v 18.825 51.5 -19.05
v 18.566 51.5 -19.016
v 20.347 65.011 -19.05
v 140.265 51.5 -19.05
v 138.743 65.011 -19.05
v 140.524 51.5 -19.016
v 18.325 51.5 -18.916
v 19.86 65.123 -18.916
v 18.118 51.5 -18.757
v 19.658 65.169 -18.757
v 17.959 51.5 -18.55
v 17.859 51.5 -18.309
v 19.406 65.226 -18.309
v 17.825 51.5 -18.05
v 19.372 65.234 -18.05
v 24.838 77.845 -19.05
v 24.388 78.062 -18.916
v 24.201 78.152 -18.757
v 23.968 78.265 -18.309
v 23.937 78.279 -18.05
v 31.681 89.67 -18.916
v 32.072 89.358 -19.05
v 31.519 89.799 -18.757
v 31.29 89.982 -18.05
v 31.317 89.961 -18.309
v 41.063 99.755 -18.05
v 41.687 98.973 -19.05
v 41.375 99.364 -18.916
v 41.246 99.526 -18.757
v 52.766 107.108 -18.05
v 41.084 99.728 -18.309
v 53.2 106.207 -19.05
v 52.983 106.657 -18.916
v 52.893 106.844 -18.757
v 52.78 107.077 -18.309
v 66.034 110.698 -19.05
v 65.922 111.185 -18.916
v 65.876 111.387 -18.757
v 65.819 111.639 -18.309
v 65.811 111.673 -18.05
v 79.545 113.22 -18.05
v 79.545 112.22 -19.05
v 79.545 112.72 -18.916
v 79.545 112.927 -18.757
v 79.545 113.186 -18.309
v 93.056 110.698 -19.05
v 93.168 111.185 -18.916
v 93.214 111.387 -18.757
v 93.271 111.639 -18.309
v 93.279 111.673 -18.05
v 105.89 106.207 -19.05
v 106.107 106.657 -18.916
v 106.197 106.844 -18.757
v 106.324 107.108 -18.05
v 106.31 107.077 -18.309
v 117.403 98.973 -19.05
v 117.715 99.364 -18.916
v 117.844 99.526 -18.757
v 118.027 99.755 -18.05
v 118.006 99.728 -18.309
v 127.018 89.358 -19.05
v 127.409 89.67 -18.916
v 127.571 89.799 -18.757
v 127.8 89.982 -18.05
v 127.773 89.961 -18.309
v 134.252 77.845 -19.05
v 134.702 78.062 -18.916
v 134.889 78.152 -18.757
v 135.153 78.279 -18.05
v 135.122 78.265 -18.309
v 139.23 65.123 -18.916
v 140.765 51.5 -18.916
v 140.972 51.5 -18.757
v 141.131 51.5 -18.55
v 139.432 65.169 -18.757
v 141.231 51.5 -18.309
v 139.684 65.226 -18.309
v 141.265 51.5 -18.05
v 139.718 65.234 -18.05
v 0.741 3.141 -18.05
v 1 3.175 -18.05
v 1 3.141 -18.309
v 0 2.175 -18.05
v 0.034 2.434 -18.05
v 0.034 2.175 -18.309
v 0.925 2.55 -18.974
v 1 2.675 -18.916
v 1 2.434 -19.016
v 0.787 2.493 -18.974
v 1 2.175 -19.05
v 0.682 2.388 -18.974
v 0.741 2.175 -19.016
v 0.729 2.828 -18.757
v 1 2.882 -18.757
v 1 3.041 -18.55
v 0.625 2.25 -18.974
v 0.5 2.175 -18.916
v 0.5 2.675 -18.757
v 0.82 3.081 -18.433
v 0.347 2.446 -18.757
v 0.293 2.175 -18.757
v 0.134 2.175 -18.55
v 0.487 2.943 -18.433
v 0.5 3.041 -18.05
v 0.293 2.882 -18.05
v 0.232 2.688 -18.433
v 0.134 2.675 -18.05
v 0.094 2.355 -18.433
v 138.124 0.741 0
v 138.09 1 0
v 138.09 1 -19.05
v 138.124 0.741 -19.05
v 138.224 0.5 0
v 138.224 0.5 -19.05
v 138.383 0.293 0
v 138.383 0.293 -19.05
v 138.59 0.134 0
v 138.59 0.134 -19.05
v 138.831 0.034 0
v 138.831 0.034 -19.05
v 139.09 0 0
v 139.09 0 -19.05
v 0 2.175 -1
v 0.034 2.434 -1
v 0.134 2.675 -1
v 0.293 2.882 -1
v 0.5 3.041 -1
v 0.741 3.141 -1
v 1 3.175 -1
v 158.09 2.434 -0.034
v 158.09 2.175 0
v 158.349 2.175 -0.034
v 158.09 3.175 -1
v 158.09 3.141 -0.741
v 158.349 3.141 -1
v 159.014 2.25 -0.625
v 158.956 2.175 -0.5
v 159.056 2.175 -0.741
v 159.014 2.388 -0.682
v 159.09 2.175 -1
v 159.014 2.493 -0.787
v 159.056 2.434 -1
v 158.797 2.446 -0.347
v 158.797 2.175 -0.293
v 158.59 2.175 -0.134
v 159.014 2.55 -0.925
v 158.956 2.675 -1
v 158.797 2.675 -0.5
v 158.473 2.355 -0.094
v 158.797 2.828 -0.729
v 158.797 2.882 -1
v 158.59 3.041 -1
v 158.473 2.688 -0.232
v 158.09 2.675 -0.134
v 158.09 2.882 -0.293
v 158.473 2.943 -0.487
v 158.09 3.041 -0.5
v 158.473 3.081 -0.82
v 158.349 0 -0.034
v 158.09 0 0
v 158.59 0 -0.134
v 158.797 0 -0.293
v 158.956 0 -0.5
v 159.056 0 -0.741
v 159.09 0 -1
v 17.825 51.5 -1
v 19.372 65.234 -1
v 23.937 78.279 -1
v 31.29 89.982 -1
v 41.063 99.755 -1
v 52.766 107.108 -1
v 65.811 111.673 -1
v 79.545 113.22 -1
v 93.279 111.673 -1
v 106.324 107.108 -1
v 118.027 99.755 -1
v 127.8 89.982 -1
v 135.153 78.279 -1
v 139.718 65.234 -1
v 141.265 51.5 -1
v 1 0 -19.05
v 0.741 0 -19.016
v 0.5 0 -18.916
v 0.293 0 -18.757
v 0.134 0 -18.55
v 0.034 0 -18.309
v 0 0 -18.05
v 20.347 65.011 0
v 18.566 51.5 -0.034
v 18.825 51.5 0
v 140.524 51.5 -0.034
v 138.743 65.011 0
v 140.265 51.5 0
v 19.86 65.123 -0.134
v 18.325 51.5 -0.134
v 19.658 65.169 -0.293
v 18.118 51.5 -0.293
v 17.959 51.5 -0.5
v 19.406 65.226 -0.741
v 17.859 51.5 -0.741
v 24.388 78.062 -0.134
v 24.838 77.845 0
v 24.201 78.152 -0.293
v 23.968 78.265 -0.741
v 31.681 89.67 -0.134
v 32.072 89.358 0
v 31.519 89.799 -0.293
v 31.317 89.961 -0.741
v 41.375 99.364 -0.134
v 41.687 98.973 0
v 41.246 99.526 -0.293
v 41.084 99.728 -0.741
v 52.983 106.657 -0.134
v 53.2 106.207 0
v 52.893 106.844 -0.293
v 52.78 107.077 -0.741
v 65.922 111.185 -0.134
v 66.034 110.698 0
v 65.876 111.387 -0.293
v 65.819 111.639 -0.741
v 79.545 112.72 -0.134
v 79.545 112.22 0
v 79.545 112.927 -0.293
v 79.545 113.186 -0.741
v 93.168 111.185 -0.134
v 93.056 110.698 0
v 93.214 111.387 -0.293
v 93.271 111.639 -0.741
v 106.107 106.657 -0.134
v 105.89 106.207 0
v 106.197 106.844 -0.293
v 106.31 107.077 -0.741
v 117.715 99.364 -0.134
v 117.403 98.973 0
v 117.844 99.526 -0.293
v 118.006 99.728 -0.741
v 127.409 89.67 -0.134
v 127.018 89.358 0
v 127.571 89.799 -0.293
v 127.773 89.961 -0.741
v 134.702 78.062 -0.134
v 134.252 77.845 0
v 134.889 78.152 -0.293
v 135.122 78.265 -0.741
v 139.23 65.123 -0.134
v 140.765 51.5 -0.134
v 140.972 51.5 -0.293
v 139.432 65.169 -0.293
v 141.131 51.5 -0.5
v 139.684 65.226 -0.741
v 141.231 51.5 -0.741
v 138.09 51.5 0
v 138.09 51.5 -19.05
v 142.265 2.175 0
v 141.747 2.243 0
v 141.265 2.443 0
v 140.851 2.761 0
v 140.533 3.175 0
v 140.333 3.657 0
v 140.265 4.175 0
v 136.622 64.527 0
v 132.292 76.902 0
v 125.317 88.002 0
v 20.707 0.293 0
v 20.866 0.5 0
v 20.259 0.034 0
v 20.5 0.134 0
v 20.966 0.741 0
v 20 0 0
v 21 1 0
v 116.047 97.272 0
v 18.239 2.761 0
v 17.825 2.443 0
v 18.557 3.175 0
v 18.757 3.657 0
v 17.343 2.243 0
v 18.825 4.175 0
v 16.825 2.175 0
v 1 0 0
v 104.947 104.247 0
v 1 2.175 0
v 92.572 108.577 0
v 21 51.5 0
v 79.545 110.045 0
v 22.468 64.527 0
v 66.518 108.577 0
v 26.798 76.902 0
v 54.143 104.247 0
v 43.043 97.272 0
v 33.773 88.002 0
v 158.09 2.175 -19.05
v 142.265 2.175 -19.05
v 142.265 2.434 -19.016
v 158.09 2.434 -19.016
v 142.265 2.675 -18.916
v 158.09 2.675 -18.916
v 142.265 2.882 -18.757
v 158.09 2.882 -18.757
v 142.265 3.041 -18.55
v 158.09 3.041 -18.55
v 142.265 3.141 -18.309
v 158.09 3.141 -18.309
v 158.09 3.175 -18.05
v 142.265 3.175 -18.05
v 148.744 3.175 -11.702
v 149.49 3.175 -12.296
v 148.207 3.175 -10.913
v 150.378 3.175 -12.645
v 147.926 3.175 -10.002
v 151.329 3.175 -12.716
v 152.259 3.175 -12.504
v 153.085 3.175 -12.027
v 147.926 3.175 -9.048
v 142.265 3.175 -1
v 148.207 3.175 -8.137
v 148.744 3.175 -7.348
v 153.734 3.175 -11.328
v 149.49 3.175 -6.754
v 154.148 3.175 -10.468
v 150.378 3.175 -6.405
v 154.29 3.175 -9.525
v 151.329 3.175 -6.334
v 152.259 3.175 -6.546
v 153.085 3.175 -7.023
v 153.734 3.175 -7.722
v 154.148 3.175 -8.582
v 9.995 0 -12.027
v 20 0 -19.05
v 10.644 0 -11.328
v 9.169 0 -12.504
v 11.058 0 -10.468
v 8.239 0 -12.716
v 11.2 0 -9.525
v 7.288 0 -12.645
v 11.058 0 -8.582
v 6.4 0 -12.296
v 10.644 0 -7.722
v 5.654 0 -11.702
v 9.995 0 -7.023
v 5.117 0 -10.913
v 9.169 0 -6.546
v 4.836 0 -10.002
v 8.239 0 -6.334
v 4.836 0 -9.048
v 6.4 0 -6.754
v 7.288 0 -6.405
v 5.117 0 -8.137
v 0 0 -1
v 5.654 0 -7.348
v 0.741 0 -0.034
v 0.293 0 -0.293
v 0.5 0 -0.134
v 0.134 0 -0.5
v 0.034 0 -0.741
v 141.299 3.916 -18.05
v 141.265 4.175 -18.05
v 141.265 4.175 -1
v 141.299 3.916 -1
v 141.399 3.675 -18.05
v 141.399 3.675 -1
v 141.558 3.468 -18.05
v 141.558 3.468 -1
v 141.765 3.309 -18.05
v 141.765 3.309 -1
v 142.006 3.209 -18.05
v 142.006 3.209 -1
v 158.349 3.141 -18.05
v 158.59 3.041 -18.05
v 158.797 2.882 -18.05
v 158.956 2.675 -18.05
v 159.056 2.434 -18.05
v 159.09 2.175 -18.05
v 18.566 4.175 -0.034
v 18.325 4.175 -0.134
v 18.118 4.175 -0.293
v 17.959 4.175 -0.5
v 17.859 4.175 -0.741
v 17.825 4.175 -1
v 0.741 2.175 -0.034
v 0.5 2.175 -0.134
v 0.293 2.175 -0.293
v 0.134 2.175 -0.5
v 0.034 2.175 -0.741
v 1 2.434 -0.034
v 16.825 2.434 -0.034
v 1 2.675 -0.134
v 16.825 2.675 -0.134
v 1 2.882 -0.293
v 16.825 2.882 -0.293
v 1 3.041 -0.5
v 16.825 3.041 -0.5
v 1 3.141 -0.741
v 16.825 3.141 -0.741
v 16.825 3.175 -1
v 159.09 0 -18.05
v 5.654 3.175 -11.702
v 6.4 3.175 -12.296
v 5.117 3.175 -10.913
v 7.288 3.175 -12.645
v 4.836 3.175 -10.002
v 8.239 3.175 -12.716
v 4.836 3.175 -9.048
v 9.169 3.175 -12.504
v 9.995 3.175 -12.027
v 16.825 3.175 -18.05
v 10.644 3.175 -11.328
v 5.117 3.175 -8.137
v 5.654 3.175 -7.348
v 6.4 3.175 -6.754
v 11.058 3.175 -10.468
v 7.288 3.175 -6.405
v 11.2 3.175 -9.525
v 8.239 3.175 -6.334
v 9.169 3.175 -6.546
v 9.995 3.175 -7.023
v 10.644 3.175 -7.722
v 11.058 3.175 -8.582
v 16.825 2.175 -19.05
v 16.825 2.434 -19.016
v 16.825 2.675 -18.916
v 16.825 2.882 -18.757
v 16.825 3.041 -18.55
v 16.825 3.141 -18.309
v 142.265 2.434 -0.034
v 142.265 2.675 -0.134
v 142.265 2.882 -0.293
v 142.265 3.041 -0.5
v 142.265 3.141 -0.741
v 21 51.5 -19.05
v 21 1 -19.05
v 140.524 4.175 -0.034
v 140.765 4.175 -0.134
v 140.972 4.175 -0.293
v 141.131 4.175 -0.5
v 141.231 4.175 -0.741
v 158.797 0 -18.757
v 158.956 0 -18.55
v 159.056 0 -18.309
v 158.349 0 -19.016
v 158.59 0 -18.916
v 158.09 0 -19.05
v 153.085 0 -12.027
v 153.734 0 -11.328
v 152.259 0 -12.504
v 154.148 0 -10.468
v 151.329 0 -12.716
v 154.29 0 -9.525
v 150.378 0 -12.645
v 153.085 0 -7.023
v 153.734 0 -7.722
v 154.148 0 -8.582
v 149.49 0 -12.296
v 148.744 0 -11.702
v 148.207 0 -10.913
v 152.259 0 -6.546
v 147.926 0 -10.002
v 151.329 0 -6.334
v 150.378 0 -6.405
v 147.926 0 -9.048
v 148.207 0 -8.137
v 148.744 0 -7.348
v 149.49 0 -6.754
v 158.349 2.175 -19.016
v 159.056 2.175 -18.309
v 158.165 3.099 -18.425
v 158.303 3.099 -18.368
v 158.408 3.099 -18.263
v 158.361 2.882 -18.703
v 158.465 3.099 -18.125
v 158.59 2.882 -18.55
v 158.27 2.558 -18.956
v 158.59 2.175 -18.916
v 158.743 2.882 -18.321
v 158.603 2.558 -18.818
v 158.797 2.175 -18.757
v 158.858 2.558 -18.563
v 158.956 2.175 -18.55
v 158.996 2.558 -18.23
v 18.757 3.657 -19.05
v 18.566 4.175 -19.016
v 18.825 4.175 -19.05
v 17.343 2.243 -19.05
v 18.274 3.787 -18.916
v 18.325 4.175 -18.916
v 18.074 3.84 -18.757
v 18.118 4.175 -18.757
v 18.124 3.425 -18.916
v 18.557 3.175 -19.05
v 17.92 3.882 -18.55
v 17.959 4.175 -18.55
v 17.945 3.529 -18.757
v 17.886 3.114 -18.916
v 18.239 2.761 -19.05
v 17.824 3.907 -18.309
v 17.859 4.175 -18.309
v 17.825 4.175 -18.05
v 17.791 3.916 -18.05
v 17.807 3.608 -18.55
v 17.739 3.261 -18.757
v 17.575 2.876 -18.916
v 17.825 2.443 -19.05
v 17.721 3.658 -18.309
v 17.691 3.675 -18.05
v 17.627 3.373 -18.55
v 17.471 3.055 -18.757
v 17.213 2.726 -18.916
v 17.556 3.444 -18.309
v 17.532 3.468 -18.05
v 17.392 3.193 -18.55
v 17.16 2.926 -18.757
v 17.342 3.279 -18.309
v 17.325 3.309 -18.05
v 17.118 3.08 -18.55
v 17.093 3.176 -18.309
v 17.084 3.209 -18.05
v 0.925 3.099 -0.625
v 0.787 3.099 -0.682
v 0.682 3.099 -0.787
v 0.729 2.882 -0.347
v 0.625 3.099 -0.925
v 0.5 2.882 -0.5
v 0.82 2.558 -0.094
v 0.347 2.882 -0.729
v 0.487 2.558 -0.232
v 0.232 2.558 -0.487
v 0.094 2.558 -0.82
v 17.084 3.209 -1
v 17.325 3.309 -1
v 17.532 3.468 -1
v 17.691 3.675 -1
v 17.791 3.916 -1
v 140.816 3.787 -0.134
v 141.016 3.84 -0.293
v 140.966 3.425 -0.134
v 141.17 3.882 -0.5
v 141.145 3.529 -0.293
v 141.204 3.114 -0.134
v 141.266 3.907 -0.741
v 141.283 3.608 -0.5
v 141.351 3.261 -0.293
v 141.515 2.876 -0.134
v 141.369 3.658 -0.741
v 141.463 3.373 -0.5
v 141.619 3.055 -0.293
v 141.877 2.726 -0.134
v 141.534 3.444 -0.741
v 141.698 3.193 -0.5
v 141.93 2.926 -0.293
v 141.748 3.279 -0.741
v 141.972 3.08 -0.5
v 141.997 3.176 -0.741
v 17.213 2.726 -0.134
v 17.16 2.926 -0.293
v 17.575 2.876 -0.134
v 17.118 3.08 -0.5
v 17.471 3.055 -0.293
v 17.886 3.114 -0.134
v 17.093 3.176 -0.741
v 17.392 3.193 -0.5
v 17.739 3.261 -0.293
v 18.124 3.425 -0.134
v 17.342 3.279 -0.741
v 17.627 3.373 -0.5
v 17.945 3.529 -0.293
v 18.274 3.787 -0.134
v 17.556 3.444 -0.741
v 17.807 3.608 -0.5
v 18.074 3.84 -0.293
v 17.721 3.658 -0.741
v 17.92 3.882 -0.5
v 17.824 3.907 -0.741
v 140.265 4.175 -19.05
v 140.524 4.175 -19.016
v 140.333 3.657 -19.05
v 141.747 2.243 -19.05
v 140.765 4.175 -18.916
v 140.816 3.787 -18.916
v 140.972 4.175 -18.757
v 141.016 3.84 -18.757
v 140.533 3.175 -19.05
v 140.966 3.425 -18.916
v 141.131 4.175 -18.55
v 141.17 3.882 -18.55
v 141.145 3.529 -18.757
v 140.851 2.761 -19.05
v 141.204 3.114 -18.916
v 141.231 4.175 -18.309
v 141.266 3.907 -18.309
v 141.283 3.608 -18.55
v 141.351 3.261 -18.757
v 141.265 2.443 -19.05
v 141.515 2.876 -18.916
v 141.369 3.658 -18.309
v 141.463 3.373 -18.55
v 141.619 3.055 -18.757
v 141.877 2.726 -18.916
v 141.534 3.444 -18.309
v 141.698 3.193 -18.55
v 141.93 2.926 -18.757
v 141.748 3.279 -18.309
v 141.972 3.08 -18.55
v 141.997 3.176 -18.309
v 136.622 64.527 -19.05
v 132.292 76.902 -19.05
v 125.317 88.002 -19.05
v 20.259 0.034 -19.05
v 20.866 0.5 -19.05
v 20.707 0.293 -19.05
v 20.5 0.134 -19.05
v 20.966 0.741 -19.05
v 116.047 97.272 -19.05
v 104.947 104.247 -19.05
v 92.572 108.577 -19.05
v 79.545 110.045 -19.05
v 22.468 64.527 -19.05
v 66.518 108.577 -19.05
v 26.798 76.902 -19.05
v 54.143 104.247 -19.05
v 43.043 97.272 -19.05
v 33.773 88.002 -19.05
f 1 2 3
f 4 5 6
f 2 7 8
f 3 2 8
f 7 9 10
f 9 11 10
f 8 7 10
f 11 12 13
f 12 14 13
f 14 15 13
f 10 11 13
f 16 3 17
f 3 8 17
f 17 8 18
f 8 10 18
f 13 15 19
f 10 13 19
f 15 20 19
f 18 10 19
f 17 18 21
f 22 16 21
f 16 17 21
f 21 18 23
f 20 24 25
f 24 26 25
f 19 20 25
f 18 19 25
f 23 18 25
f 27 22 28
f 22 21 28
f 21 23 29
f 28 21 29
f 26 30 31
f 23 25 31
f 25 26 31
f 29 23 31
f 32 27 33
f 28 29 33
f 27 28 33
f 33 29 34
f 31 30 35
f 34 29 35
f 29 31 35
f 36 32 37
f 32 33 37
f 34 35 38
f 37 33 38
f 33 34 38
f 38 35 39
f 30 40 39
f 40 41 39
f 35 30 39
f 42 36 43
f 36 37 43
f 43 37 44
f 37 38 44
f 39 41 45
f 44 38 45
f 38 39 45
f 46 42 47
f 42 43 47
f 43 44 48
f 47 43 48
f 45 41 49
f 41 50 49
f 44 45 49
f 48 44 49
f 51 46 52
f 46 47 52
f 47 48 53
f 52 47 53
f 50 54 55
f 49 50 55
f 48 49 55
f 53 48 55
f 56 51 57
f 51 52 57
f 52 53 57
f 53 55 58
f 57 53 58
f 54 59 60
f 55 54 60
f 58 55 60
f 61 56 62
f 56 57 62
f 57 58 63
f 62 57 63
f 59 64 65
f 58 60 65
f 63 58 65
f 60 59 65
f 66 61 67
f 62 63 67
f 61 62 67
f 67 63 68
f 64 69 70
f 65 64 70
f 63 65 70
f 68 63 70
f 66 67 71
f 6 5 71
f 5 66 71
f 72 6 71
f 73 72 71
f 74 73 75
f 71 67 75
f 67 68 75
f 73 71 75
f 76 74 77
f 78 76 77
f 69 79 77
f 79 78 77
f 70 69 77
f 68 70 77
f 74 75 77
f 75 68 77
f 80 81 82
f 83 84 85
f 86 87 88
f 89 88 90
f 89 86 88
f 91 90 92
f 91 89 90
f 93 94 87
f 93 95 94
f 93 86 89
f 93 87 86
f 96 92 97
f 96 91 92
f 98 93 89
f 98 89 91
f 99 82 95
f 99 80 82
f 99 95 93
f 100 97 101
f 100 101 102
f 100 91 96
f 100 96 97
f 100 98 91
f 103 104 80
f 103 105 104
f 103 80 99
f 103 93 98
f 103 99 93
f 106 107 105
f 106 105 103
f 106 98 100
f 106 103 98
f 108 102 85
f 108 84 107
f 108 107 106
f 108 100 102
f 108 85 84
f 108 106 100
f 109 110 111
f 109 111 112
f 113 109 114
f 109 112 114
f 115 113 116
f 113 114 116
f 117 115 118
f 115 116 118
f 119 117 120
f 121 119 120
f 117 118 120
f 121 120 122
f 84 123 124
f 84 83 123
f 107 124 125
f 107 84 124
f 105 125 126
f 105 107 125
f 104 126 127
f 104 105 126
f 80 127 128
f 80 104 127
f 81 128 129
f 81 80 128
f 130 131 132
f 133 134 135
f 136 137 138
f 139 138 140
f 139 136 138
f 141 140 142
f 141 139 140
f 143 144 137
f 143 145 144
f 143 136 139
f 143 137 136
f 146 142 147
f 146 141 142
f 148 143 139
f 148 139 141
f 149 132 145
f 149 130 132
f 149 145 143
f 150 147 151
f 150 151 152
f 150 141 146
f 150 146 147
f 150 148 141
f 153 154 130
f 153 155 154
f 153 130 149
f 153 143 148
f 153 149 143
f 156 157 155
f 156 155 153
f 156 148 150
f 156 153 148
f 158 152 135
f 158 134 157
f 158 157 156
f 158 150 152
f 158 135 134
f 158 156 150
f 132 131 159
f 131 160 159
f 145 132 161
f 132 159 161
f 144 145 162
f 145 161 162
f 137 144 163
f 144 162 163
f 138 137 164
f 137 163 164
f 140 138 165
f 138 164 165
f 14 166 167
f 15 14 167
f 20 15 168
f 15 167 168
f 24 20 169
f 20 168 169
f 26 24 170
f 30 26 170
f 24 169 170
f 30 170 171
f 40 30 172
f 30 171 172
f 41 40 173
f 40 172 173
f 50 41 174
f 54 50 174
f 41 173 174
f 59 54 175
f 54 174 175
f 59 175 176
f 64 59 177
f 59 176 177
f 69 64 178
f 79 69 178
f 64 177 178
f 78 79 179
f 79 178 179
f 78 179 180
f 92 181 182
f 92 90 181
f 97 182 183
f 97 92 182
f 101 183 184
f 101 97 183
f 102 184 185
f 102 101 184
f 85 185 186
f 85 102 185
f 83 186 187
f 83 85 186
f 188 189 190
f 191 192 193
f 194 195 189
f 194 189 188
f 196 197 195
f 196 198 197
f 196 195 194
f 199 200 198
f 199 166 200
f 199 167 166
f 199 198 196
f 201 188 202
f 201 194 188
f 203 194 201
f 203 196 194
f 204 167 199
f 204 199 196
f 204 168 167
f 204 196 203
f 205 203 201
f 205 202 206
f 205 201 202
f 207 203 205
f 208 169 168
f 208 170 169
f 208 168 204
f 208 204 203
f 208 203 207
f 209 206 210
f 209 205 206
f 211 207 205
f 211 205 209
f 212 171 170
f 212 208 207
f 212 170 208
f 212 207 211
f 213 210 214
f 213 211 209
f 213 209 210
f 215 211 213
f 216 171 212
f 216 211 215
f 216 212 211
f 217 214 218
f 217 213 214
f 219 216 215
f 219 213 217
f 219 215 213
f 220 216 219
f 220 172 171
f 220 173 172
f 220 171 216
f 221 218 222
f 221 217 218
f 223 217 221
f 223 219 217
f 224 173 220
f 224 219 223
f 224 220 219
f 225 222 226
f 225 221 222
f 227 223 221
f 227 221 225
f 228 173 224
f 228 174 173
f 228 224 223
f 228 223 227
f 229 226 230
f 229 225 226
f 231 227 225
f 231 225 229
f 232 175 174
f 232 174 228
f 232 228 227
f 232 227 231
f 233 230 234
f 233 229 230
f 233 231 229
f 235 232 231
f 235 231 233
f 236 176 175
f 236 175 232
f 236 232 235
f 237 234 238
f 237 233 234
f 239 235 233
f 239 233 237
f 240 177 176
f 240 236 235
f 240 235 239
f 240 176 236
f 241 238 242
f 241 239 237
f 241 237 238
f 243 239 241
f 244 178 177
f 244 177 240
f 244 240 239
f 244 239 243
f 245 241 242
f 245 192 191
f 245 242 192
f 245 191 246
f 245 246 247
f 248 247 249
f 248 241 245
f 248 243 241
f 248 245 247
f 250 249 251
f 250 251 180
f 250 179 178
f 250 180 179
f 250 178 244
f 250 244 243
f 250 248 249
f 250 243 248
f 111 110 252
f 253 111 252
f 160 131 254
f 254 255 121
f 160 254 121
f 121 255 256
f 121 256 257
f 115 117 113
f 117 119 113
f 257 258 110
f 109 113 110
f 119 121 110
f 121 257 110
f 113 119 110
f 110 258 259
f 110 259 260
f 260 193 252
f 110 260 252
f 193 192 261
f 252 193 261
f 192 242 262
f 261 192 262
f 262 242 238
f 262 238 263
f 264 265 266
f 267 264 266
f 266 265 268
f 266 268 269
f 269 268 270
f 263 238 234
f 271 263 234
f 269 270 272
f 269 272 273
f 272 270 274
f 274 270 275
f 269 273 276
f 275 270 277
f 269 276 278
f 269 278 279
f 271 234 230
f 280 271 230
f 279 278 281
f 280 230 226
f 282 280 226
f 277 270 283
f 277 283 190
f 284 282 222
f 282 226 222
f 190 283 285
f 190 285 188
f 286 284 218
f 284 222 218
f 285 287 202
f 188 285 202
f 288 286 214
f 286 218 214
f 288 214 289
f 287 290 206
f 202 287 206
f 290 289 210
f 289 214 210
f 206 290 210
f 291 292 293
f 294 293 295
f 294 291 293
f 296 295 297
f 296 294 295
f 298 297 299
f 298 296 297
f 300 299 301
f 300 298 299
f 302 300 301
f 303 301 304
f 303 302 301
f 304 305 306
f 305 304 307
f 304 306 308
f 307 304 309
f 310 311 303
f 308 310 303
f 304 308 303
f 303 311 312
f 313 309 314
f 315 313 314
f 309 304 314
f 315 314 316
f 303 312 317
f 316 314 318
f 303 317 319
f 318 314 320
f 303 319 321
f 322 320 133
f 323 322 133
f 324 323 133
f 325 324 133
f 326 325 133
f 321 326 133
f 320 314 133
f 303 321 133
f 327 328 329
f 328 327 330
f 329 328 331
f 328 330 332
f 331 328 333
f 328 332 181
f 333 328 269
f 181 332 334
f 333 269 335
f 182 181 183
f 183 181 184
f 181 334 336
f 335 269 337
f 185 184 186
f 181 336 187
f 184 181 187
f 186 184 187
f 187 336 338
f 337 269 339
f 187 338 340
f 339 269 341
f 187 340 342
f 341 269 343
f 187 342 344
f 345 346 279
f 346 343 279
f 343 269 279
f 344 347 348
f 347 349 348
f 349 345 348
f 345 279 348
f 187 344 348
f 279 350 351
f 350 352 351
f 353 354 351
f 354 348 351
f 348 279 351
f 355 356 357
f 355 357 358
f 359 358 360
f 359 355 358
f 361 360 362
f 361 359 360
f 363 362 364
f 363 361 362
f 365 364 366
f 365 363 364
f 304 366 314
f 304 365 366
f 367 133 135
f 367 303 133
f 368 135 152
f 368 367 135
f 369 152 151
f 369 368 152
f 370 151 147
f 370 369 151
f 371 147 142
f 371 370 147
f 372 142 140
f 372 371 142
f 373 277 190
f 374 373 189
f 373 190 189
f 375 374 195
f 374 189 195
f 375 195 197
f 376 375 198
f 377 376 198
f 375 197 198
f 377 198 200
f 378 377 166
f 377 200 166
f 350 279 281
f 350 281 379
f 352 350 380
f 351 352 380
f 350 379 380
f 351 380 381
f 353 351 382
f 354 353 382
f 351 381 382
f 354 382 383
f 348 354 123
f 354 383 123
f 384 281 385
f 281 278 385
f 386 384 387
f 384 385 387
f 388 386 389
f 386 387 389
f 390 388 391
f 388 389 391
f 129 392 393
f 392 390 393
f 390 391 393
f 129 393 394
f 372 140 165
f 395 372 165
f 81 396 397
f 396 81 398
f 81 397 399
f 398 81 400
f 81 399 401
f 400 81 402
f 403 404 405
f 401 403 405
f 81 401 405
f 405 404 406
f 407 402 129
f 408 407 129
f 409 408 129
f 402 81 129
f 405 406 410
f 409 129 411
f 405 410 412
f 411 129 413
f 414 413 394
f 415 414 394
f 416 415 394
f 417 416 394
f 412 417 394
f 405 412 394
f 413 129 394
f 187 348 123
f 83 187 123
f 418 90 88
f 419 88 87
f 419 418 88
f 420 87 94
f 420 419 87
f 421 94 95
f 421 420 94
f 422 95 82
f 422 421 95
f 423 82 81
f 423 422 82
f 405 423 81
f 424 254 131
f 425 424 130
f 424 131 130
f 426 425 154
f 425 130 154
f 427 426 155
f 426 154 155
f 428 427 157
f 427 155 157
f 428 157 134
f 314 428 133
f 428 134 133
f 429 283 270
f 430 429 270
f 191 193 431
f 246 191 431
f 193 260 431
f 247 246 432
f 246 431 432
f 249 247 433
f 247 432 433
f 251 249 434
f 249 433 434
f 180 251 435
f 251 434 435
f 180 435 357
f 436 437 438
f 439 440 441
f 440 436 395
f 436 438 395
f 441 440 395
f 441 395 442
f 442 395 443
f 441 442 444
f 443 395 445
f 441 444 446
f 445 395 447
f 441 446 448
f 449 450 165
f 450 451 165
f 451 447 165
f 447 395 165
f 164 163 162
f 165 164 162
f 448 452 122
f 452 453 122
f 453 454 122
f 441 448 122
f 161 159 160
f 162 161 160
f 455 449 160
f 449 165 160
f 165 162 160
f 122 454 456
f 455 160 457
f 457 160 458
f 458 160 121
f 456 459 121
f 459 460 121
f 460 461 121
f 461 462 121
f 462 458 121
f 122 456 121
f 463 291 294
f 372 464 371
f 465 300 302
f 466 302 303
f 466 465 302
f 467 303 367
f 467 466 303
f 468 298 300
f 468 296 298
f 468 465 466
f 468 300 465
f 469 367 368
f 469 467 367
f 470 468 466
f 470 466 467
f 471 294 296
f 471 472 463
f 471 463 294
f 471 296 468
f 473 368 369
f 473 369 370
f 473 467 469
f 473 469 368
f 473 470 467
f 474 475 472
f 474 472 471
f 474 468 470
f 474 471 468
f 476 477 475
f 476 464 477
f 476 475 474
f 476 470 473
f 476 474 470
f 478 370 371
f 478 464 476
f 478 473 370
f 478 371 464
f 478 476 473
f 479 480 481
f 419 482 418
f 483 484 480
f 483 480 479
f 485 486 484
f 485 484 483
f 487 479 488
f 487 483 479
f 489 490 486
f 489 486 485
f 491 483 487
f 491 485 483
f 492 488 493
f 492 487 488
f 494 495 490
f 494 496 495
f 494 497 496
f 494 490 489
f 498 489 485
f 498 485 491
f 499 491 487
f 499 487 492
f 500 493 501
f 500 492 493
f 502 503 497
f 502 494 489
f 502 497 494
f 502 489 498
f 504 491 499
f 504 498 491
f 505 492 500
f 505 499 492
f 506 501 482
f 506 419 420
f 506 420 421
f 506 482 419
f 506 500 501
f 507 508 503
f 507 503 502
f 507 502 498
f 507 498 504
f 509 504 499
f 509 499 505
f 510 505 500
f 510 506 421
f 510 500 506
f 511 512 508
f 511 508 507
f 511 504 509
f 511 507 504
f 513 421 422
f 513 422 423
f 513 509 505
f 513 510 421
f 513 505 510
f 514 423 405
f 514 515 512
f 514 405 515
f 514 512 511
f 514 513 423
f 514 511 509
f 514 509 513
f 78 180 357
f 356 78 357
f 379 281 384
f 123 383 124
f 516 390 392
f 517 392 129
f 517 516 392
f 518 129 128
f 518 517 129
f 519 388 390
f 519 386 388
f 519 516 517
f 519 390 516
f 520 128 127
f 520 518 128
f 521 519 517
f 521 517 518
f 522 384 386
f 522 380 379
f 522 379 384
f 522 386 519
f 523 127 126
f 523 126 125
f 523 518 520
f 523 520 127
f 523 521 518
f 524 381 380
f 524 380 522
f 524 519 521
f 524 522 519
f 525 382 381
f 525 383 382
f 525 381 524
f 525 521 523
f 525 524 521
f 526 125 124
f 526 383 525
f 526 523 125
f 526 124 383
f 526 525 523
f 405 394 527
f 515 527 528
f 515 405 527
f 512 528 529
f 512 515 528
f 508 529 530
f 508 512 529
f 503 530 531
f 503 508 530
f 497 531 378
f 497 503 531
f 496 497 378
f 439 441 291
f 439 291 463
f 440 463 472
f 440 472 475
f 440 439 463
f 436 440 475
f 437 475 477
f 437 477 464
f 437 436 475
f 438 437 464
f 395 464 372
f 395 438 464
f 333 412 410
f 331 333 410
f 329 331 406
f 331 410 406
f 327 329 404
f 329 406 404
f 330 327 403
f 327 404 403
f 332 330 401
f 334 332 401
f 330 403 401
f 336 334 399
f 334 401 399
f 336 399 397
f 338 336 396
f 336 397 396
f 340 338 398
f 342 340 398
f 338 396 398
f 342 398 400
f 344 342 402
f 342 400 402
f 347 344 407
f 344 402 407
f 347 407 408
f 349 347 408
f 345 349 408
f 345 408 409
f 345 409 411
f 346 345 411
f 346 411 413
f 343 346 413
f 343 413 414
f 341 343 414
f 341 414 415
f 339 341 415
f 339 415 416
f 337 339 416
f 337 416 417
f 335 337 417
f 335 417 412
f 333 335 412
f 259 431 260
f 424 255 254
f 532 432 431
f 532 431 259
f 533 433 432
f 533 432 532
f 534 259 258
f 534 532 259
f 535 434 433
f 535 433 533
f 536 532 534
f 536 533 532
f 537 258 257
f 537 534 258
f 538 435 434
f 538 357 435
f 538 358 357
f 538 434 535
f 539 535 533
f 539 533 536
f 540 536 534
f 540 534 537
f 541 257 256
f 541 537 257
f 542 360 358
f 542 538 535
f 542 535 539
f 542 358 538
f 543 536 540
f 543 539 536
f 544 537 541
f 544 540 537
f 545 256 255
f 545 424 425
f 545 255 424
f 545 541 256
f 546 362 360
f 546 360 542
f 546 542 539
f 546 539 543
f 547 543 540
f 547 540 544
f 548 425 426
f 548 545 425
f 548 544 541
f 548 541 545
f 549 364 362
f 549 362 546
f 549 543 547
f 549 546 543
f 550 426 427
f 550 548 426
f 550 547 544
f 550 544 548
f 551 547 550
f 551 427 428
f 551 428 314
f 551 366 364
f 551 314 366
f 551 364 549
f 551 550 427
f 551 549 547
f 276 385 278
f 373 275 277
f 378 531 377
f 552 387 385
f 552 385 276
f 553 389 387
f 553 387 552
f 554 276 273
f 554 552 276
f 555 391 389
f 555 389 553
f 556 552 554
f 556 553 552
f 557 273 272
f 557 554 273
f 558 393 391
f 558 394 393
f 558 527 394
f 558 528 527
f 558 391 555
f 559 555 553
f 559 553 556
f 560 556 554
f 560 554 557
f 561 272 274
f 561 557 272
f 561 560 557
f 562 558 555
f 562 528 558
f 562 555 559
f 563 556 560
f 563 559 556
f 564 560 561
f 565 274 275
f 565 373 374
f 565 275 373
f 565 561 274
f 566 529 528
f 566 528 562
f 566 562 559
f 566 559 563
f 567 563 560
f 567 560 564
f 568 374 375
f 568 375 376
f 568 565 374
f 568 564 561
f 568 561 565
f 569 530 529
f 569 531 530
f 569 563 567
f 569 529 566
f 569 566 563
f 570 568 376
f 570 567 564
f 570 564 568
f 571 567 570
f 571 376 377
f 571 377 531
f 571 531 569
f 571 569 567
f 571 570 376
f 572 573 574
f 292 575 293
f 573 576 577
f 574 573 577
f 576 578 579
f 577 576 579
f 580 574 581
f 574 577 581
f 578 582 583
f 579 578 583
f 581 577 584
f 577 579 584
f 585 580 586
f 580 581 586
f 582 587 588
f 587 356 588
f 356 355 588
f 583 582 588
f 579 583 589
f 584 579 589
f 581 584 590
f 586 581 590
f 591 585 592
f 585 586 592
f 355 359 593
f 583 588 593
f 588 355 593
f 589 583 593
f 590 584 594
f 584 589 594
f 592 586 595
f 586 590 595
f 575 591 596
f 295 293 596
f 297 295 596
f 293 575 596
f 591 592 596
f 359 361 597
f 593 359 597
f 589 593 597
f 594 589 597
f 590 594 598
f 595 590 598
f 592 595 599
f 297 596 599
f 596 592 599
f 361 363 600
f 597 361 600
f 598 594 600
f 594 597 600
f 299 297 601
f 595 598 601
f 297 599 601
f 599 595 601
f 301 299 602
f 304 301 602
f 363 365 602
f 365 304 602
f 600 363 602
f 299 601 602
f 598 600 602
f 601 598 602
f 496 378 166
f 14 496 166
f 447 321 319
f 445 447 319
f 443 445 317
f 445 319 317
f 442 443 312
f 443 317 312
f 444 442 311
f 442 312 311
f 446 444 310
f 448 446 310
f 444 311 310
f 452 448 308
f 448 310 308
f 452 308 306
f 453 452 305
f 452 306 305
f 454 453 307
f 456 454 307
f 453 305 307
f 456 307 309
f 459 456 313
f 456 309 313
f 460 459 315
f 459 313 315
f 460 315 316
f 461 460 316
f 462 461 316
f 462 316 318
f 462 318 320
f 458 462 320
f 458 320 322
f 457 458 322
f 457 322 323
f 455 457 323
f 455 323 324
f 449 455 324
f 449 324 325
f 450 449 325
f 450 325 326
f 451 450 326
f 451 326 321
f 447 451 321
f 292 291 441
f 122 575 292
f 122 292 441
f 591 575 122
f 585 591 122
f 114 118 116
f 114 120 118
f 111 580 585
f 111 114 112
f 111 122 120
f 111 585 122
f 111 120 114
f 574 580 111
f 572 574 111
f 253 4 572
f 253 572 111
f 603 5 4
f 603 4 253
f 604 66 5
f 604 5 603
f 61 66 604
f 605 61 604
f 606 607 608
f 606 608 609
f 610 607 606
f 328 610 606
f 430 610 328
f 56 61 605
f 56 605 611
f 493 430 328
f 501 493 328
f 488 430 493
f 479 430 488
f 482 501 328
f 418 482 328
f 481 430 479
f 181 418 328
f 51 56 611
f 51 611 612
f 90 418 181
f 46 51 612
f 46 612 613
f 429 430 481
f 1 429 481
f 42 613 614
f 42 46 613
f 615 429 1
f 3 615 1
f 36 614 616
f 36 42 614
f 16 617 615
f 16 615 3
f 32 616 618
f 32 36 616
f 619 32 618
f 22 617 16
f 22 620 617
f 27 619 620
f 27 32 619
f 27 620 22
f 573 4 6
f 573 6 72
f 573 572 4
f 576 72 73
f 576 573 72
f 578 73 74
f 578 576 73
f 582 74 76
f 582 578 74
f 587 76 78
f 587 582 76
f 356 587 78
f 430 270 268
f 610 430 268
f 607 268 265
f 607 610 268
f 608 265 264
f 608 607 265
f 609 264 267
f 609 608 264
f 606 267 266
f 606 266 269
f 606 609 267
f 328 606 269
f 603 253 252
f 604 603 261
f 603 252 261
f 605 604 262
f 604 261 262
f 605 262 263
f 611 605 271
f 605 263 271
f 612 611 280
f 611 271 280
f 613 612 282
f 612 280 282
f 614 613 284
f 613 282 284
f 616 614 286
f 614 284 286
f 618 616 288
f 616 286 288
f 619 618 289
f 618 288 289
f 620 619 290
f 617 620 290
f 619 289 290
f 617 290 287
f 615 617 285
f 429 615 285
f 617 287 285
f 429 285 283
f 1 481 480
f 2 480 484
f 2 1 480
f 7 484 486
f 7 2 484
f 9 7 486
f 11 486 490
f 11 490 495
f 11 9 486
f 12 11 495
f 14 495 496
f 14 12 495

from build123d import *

# Parameters (mm, degrees)
BOSS_EXTRUDE1_DEPTH = 19.05
CUT_EXTRUDE1_REACH  = 5.175
SKETCH2_R           = 3.2
FILLET1_R           = 1


with BuildPart() as part:
    # Sketch1 → Boss-Extrude1 (new body)
    with BuildSketch(Plane.XY):
        with BuildLine():
            Line((21, 51.5), (21, 0))
            Line((21, 0), (0, 0))
            Line((0, 0), (0, 3.175))
            Line((0, 3.175), (17.825, 3.175))
            Line((17.825, 3.175), (17.825, 51.5))
            ThreePointArc((17.825, 51.5), (79.545, 113.22), (141.265, 51.5))
            Line((141.265, 51.5), (141.265, 3.175))
            Line((141.265, 3.175), (159.09, 3.175))
            Line((159.09, 3.175), (159.09, 0))
            Line((159.09, 0), (138.09, 0))
            Line((138.09, 0), (138.09, 51.5))
            ThreePointArc((138.09, 51.5), (79.545, 110.045), (21, 51.5))
        make_face()
    extrude(amount=-BOSS_EXTRUDE1_DEPTH)

    # Sketch2 → Cut-Extrude1 (cut, up to next)
    with BuildSketch(Plane(origin=(0, 3.175, 0), x_dir=(1, 0, 0), z_dir=(0, 1, 0)), mode=Mode.PRIVATE) as cut_extrude1_sk1:
        with Locations((151.09, 9.525)):
            Circle(SKETCH2_R)
    cut_extrude1_tool1 = extrude(cut_extrude1_sk1.sketch, amount=-CUT_EXTRUDE1_REACH, mode=Mode.PRIVATE) & part.part
    add(cut_extrude1_tool1.solids().sort_by_distance((151.09, 3.175, -9.525))[0], mode=Mode.SUBTRACT)
    # Sketch2 → Cut-Extrude1 (cut, up to next)
    with BuildSketch(Plane(origin=(0, 3.175, 0), x_dir=(1, 0, 0), z_dir=(0, 1, 0)), mode=Mode.PRIVATE) as cut_extrude1_sk2:
        with Locations((8, 9.525)):
            Circle(SKETCH2_R)
    cut_extrude1_tool2 = extrude(cut_extrude1_sk2.sketch, amount=-CUT_EXTRUDE1_REACH, mode=Mode.PRIVATE) & part.part
    add(cut_extrude1_tool2.solids().sort_by_distance((8, 3.175, -9.525))[0], mode=Mode.SUBTRACT)

    # Fillet1
    fillet1_edges = [part.edges().sort_by_distance(p)[0] for p in [
        (0, 1.5875, 0),
        (8.9125, 3.175, 0),
        (17.825, 27.3375, 0),
        (79.545, 113.22, 0),
        (141.265, 27.3375, 0),
        (150.1775, 3.175, 0),
        (159.09, 1.5875, 0),
        (159.09, 1.5875, -19.05),
        (21, 0, -9.525),
        (150.1775, 3.175, -19.05),
        (0, 3.175, -9.525),
        (17.825, 3.175, -9.525),
        (141.265, 3.175, -9.525),
        (159.09, 3.175, -9.525),
        (138.09, 0, -9.525),
        (141.265, 27.3375, -19.05),
        (79.545, 113.22, -19.05),
        (17.825, 27.3375, -19.05),
        (8.9125, 3.175, -19.05),
        (0, 1.5875, -19.05),
    ]]
    fillet(fillet1_edges, radius=FILLET1_R)


solid = part.part
